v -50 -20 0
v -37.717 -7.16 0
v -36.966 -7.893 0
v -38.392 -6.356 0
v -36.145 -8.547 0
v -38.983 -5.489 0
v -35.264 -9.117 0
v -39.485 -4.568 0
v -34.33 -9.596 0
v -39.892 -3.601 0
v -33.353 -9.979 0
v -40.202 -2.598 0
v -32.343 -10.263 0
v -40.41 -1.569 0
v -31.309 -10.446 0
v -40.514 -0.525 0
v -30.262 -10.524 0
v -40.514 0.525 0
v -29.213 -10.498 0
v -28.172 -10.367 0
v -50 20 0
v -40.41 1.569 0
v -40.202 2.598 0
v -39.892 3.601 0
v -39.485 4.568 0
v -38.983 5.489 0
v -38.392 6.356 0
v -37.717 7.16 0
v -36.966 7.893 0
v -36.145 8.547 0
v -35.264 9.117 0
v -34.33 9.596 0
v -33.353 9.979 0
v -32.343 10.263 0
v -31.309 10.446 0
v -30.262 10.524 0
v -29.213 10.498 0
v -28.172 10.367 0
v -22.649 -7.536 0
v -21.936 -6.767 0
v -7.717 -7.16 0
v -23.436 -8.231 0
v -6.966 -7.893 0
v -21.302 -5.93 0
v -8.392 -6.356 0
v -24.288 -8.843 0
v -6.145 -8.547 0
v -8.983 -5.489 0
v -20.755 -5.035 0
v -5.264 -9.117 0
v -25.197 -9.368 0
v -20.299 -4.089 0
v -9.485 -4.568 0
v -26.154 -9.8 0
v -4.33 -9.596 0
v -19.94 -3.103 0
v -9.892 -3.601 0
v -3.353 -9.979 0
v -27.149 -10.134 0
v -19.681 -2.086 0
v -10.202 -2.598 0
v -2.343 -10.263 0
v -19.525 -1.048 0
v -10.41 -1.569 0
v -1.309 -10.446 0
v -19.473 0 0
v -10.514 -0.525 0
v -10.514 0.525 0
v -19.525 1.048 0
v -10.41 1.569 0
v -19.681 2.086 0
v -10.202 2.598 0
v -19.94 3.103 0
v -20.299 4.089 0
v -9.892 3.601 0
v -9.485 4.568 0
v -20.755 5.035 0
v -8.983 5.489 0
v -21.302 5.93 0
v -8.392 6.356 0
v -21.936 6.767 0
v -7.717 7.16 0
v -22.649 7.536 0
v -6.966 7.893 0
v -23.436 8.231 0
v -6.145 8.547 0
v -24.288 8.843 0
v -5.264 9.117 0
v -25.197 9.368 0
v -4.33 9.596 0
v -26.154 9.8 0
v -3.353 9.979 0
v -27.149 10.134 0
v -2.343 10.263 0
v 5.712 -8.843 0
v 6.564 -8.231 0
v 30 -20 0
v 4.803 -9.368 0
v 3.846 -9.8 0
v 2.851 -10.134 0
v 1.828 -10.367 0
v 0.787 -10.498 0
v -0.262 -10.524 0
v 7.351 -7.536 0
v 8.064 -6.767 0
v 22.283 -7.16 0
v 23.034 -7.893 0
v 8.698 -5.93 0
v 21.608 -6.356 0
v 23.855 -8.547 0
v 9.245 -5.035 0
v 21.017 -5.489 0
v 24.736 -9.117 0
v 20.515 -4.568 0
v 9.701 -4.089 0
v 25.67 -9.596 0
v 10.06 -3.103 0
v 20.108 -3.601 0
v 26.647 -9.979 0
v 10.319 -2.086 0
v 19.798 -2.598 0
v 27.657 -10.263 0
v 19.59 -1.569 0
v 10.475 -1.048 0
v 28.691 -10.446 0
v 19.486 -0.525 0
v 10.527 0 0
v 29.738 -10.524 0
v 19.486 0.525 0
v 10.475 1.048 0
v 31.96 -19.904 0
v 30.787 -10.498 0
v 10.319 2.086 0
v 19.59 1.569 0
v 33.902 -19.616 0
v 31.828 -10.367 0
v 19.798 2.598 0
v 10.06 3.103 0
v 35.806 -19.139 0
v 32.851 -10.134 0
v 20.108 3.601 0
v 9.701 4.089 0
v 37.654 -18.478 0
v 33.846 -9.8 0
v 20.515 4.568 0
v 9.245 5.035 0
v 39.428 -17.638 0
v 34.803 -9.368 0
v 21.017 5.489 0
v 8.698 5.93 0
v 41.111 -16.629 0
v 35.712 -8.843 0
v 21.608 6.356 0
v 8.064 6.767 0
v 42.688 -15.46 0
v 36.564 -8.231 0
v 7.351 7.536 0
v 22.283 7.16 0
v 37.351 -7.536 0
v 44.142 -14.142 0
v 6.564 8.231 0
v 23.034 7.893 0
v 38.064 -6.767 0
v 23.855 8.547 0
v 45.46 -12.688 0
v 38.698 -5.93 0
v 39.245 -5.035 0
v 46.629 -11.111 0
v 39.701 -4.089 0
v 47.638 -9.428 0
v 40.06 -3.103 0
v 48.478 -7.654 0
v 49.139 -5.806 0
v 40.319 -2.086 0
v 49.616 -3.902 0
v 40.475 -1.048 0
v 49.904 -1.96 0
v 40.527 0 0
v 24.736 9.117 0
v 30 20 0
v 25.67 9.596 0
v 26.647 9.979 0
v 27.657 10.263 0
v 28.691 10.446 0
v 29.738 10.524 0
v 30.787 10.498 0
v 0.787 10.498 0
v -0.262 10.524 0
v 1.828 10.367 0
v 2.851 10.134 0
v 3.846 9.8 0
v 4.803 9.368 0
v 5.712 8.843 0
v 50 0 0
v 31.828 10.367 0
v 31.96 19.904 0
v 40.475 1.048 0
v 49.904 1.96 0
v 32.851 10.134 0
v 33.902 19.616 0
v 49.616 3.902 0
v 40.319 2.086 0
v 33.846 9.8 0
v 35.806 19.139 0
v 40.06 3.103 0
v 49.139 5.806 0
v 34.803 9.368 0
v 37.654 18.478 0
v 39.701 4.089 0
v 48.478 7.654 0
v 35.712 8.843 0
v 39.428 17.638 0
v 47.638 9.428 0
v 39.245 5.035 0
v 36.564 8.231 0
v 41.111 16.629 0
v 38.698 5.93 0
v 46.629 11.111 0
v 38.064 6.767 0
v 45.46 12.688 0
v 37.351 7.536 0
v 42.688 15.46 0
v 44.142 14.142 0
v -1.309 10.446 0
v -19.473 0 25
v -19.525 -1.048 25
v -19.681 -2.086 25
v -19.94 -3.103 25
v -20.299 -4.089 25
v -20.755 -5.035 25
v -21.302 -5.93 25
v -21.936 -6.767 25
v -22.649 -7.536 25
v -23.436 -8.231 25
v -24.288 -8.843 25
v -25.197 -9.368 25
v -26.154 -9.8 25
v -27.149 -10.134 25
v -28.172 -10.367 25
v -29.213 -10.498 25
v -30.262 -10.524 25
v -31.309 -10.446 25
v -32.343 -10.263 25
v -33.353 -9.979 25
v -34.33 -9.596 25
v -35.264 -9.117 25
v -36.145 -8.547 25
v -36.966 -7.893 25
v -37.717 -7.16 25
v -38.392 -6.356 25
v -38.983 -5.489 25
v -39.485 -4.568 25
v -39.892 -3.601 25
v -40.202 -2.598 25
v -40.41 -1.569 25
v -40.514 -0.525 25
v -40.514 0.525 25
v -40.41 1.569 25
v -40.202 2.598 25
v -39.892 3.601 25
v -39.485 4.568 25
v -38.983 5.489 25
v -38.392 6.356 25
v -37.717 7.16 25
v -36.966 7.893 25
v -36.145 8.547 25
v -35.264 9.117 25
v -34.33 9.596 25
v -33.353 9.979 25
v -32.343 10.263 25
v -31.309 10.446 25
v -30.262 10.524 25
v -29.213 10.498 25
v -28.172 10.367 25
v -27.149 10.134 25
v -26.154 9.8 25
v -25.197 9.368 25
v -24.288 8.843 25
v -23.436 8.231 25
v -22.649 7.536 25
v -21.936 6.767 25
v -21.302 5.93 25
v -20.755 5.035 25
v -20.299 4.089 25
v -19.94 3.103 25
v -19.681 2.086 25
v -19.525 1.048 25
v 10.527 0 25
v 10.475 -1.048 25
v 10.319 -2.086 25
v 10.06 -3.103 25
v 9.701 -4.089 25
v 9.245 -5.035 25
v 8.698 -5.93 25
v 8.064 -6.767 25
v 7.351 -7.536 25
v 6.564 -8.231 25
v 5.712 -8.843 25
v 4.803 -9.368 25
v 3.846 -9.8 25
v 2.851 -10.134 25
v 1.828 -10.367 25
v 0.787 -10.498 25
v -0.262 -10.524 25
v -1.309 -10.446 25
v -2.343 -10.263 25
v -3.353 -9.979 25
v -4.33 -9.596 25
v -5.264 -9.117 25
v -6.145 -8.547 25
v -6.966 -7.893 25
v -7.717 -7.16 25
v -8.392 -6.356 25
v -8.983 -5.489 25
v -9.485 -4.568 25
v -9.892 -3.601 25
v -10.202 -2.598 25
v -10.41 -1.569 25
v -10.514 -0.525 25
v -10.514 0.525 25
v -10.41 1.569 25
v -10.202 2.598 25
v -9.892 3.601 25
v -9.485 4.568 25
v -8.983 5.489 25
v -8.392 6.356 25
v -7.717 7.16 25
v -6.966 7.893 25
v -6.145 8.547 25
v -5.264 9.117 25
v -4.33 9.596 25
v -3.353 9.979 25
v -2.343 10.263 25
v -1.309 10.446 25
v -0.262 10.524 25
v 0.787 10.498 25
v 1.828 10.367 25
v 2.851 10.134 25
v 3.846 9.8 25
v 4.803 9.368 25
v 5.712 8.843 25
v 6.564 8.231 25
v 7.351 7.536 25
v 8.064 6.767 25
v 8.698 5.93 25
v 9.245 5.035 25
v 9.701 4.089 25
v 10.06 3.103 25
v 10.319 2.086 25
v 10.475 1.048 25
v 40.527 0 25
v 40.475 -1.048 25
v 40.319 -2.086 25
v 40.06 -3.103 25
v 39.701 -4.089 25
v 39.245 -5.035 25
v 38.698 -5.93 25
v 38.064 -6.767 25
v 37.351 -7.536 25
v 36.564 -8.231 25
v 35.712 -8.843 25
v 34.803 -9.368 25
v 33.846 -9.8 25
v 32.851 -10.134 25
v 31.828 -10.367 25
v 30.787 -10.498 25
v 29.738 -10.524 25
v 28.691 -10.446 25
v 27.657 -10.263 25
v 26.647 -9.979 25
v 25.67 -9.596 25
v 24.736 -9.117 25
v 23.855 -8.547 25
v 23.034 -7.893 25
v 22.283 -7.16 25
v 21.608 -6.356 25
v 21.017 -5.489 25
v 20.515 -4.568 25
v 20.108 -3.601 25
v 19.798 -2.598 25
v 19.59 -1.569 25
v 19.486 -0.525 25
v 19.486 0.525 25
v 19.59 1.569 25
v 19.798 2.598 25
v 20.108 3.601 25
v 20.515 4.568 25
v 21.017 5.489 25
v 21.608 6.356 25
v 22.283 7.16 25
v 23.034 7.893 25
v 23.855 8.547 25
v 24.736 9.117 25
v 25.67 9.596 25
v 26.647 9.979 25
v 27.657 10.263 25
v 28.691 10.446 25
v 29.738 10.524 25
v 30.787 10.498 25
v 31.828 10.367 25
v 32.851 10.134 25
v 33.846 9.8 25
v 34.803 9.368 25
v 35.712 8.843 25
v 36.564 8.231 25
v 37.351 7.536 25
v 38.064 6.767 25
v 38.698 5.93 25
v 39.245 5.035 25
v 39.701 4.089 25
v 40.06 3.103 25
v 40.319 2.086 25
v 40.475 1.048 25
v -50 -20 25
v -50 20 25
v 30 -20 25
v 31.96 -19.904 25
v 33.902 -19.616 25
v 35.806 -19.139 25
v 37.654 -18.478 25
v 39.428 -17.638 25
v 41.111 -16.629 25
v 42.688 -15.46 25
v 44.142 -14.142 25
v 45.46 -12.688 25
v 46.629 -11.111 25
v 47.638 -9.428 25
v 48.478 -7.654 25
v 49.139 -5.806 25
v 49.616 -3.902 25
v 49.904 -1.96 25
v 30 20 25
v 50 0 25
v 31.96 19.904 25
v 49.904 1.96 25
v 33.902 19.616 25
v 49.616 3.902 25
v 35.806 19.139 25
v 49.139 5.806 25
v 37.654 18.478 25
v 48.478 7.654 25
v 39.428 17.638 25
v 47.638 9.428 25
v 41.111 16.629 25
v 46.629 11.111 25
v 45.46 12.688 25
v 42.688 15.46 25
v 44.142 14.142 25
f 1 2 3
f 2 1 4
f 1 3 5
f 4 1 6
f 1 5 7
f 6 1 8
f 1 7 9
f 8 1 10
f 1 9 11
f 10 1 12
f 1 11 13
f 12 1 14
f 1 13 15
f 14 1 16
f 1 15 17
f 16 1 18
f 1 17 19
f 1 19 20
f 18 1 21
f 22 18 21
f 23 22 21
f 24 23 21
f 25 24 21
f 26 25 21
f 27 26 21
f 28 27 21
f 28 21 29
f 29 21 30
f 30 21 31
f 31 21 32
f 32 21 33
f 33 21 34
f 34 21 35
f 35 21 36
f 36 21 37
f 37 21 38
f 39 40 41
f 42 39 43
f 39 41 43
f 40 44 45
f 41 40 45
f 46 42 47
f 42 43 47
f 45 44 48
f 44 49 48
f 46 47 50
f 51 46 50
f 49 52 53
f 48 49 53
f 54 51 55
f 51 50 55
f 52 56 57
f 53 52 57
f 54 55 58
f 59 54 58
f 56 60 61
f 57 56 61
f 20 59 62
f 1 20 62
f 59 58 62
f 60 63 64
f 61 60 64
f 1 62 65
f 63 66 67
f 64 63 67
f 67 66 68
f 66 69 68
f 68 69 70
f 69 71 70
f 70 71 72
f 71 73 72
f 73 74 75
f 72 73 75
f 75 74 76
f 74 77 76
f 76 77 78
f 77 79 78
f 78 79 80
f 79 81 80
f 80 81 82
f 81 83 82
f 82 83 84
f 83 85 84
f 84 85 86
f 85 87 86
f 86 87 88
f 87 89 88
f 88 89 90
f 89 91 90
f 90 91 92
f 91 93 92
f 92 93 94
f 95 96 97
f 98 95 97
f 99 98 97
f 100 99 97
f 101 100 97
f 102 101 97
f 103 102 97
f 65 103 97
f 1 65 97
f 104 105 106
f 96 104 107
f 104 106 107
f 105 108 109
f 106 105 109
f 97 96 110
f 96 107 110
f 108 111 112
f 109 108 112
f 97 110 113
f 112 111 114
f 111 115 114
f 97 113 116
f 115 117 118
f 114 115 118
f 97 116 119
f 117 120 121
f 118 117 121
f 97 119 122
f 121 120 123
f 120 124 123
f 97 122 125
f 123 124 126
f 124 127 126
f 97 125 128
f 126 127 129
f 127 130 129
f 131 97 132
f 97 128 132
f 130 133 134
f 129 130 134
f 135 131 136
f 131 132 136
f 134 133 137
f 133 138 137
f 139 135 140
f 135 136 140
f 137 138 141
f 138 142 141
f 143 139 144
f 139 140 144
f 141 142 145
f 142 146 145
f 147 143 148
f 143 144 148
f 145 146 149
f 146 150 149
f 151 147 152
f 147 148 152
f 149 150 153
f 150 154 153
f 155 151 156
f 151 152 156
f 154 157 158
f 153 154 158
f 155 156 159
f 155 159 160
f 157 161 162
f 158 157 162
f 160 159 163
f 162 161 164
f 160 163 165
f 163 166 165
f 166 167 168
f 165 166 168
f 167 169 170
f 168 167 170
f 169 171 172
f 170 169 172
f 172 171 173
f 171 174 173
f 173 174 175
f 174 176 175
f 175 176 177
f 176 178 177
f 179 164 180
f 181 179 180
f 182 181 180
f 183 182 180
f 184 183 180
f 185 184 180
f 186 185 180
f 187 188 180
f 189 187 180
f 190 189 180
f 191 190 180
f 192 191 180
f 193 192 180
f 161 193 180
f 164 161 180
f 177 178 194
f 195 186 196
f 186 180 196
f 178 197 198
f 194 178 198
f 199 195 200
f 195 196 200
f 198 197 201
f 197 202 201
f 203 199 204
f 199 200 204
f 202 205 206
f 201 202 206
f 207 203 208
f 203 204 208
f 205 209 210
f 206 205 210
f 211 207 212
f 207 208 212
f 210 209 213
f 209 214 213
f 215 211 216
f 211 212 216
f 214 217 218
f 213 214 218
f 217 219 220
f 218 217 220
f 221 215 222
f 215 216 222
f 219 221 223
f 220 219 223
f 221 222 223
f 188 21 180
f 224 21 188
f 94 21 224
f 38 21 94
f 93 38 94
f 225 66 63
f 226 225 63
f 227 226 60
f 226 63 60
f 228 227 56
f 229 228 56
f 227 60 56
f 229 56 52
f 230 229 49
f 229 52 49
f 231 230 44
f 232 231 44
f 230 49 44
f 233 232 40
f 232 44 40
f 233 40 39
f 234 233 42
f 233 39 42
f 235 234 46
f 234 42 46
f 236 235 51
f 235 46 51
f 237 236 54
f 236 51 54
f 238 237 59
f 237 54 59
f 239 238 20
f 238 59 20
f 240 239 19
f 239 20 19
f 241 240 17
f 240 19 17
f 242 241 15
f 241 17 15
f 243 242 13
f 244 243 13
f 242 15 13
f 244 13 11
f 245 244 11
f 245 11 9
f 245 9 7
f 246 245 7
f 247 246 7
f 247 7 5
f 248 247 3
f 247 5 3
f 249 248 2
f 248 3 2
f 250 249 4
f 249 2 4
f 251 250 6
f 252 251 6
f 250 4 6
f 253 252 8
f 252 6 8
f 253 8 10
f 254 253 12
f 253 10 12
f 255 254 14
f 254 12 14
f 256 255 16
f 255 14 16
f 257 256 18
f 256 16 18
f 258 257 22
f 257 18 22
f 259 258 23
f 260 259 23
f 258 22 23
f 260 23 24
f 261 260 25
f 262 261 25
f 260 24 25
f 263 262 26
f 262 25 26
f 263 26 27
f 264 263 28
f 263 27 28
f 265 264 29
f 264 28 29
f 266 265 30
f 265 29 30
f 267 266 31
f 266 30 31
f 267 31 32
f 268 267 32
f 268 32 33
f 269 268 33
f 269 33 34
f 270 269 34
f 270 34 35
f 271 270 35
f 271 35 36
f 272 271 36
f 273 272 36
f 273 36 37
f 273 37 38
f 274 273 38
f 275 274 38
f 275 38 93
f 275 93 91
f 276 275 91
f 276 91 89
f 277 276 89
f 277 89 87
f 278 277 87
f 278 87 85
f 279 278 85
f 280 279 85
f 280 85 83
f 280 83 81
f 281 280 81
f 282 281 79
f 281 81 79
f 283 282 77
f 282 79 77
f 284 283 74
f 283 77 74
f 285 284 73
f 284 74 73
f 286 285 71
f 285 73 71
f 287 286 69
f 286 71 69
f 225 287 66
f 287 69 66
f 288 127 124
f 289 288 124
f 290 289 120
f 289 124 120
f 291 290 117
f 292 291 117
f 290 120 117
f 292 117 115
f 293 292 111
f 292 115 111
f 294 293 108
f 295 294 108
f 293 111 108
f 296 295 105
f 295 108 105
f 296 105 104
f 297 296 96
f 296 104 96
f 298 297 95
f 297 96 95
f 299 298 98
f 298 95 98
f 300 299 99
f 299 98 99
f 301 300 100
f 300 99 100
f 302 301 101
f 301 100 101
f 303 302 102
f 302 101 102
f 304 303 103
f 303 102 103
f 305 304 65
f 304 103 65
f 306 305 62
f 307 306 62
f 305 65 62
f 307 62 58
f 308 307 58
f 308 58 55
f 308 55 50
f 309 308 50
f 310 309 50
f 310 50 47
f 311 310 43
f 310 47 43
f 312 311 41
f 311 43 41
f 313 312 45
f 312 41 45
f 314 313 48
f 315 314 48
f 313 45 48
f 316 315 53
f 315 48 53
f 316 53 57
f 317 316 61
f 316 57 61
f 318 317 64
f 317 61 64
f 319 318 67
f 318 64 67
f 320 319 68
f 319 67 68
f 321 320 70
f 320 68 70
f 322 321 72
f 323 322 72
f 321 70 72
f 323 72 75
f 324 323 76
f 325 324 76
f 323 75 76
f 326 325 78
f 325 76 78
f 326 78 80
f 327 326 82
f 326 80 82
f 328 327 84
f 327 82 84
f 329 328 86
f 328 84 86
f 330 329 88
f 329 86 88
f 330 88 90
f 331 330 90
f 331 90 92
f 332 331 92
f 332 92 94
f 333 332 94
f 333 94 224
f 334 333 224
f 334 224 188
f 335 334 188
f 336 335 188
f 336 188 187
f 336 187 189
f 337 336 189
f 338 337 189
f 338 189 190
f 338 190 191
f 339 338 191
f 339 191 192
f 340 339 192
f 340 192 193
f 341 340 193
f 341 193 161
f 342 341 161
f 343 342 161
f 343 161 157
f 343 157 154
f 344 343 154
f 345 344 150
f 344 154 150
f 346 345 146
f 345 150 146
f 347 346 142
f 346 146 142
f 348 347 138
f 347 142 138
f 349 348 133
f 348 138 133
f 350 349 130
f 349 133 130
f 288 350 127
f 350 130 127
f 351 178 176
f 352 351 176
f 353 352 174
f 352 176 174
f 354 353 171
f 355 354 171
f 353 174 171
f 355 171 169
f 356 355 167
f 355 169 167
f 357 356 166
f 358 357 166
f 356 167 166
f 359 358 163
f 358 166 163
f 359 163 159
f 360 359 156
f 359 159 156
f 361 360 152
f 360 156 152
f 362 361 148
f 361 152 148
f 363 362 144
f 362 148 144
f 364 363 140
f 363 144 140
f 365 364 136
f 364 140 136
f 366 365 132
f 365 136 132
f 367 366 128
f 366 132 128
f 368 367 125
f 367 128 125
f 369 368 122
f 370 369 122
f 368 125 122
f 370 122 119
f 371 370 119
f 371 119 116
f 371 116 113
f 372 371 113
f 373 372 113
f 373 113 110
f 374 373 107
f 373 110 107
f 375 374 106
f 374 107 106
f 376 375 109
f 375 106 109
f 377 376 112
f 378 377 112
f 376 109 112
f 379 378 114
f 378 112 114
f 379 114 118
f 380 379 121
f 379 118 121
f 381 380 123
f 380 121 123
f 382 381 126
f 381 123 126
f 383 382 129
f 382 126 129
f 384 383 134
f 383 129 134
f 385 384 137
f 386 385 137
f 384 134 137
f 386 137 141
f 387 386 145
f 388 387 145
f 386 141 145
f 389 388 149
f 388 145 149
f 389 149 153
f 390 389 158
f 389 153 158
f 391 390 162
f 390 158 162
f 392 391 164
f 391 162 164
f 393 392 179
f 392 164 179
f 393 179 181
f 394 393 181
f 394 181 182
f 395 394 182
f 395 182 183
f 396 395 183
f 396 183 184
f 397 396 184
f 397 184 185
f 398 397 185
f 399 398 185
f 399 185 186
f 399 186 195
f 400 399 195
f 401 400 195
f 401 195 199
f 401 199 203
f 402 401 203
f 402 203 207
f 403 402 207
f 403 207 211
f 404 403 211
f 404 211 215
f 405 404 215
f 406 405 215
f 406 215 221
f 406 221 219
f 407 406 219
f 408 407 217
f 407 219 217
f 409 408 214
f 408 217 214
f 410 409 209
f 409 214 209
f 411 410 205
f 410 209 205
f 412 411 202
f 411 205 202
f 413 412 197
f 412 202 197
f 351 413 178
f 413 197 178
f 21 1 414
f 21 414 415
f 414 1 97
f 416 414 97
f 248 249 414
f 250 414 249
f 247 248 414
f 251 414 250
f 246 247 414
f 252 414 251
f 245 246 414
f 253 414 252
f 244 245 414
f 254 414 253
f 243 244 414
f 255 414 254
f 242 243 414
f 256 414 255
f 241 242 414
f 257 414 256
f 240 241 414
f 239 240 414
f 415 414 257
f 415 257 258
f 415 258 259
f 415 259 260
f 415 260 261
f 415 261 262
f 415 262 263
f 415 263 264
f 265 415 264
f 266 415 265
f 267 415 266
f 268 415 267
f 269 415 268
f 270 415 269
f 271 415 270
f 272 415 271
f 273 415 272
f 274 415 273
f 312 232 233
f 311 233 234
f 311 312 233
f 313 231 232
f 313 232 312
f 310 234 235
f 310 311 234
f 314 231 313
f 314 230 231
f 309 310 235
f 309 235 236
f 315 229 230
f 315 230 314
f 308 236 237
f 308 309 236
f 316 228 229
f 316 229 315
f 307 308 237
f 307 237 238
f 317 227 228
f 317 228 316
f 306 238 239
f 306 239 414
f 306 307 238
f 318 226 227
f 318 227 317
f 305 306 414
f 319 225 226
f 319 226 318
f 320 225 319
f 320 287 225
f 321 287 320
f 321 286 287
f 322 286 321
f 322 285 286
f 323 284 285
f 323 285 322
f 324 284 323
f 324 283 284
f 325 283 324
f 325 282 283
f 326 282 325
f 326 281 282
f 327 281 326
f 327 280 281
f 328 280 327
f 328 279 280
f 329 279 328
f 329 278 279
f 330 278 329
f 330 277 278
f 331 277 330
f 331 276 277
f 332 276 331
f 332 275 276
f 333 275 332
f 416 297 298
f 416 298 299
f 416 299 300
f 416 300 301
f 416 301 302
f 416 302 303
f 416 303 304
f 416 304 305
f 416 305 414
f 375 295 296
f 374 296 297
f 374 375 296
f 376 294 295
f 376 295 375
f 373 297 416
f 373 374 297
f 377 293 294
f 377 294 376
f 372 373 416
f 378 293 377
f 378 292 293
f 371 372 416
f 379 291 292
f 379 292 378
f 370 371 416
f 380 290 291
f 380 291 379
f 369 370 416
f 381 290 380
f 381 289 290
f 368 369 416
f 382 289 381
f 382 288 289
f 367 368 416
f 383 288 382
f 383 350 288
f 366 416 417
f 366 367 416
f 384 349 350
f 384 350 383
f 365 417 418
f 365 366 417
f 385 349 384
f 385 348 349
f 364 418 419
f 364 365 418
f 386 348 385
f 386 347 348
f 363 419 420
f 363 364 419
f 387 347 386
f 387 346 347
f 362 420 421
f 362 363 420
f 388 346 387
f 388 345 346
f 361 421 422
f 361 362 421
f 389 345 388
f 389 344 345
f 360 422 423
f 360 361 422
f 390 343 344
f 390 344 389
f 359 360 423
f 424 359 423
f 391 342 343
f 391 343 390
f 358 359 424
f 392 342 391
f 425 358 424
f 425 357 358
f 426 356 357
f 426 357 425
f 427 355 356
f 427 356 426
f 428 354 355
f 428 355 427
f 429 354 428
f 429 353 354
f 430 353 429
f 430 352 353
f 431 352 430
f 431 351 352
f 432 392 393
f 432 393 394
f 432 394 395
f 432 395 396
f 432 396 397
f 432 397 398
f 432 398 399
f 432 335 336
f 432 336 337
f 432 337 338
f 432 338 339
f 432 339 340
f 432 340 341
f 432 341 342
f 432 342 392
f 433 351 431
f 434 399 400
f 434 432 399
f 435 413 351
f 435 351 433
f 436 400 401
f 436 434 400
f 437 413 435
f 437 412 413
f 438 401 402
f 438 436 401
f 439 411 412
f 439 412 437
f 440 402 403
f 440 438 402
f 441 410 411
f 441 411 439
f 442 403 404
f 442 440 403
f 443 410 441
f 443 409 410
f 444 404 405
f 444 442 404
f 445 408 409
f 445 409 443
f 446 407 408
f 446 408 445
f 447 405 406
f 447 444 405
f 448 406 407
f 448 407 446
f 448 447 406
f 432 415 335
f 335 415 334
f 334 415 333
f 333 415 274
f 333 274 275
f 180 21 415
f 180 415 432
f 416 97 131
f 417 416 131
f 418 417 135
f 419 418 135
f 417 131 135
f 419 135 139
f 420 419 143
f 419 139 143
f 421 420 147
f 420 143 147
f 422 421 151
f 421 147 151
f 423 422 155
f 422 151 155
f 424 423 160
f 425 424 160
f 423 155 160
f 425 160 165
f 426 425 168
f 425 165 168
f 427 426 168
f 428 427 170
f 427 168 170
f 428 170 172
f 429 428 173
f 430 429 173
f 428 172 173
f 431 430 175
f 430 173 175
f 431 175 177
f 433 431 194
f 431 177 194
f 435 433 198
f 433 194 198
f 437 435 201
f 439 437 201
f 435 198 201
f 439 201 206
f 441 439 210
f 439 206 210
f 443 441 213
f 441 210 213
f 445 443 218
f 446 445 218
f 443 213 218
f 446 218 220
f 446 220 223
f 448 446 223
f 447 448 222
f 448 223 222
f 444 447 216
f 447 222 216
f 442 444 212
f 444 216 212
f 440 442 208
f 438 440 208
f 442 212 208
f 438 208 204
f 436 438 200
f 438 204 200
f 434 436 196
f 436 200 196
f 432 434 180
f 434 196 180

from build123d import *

# Parameters (mm, degrees)
F0_W     = 80
F0_H     = 40
F1_DEPTH = 25
F2_R     = 10.527281
F3_DEPTH = 25


with BuildPart() as f1:
    # F0 (on Top) → F1 (new body)
    with BuildSketch(Plane.XY):
        with Locations((-10, 0)):
            Rectangle(F0_W, F0_H)
        with BuildLine():
            ThreePointArc((30, -20), (50, 0), (30, 20))
            Line((30, 20), (30, -20))
        make_face()
    extrude(amount=F1_DEPTH)

    # F2 (on face) → F3 (cut, through all)
    with BuildSketch(Plane(origin=(0, 0, 0), x_dir=(1, 0, 0), z_dir=(0, 0, -1))):
        with Locations((30, 0)):
            Circle(F2_R)
        Circle(F2_R)
        with Locations((-30, 0)):
            Circle(F2_R)
    extrude(amount=-F3_DEPTH, mode=Mode.SUBTRACT)


solid = f1.part
